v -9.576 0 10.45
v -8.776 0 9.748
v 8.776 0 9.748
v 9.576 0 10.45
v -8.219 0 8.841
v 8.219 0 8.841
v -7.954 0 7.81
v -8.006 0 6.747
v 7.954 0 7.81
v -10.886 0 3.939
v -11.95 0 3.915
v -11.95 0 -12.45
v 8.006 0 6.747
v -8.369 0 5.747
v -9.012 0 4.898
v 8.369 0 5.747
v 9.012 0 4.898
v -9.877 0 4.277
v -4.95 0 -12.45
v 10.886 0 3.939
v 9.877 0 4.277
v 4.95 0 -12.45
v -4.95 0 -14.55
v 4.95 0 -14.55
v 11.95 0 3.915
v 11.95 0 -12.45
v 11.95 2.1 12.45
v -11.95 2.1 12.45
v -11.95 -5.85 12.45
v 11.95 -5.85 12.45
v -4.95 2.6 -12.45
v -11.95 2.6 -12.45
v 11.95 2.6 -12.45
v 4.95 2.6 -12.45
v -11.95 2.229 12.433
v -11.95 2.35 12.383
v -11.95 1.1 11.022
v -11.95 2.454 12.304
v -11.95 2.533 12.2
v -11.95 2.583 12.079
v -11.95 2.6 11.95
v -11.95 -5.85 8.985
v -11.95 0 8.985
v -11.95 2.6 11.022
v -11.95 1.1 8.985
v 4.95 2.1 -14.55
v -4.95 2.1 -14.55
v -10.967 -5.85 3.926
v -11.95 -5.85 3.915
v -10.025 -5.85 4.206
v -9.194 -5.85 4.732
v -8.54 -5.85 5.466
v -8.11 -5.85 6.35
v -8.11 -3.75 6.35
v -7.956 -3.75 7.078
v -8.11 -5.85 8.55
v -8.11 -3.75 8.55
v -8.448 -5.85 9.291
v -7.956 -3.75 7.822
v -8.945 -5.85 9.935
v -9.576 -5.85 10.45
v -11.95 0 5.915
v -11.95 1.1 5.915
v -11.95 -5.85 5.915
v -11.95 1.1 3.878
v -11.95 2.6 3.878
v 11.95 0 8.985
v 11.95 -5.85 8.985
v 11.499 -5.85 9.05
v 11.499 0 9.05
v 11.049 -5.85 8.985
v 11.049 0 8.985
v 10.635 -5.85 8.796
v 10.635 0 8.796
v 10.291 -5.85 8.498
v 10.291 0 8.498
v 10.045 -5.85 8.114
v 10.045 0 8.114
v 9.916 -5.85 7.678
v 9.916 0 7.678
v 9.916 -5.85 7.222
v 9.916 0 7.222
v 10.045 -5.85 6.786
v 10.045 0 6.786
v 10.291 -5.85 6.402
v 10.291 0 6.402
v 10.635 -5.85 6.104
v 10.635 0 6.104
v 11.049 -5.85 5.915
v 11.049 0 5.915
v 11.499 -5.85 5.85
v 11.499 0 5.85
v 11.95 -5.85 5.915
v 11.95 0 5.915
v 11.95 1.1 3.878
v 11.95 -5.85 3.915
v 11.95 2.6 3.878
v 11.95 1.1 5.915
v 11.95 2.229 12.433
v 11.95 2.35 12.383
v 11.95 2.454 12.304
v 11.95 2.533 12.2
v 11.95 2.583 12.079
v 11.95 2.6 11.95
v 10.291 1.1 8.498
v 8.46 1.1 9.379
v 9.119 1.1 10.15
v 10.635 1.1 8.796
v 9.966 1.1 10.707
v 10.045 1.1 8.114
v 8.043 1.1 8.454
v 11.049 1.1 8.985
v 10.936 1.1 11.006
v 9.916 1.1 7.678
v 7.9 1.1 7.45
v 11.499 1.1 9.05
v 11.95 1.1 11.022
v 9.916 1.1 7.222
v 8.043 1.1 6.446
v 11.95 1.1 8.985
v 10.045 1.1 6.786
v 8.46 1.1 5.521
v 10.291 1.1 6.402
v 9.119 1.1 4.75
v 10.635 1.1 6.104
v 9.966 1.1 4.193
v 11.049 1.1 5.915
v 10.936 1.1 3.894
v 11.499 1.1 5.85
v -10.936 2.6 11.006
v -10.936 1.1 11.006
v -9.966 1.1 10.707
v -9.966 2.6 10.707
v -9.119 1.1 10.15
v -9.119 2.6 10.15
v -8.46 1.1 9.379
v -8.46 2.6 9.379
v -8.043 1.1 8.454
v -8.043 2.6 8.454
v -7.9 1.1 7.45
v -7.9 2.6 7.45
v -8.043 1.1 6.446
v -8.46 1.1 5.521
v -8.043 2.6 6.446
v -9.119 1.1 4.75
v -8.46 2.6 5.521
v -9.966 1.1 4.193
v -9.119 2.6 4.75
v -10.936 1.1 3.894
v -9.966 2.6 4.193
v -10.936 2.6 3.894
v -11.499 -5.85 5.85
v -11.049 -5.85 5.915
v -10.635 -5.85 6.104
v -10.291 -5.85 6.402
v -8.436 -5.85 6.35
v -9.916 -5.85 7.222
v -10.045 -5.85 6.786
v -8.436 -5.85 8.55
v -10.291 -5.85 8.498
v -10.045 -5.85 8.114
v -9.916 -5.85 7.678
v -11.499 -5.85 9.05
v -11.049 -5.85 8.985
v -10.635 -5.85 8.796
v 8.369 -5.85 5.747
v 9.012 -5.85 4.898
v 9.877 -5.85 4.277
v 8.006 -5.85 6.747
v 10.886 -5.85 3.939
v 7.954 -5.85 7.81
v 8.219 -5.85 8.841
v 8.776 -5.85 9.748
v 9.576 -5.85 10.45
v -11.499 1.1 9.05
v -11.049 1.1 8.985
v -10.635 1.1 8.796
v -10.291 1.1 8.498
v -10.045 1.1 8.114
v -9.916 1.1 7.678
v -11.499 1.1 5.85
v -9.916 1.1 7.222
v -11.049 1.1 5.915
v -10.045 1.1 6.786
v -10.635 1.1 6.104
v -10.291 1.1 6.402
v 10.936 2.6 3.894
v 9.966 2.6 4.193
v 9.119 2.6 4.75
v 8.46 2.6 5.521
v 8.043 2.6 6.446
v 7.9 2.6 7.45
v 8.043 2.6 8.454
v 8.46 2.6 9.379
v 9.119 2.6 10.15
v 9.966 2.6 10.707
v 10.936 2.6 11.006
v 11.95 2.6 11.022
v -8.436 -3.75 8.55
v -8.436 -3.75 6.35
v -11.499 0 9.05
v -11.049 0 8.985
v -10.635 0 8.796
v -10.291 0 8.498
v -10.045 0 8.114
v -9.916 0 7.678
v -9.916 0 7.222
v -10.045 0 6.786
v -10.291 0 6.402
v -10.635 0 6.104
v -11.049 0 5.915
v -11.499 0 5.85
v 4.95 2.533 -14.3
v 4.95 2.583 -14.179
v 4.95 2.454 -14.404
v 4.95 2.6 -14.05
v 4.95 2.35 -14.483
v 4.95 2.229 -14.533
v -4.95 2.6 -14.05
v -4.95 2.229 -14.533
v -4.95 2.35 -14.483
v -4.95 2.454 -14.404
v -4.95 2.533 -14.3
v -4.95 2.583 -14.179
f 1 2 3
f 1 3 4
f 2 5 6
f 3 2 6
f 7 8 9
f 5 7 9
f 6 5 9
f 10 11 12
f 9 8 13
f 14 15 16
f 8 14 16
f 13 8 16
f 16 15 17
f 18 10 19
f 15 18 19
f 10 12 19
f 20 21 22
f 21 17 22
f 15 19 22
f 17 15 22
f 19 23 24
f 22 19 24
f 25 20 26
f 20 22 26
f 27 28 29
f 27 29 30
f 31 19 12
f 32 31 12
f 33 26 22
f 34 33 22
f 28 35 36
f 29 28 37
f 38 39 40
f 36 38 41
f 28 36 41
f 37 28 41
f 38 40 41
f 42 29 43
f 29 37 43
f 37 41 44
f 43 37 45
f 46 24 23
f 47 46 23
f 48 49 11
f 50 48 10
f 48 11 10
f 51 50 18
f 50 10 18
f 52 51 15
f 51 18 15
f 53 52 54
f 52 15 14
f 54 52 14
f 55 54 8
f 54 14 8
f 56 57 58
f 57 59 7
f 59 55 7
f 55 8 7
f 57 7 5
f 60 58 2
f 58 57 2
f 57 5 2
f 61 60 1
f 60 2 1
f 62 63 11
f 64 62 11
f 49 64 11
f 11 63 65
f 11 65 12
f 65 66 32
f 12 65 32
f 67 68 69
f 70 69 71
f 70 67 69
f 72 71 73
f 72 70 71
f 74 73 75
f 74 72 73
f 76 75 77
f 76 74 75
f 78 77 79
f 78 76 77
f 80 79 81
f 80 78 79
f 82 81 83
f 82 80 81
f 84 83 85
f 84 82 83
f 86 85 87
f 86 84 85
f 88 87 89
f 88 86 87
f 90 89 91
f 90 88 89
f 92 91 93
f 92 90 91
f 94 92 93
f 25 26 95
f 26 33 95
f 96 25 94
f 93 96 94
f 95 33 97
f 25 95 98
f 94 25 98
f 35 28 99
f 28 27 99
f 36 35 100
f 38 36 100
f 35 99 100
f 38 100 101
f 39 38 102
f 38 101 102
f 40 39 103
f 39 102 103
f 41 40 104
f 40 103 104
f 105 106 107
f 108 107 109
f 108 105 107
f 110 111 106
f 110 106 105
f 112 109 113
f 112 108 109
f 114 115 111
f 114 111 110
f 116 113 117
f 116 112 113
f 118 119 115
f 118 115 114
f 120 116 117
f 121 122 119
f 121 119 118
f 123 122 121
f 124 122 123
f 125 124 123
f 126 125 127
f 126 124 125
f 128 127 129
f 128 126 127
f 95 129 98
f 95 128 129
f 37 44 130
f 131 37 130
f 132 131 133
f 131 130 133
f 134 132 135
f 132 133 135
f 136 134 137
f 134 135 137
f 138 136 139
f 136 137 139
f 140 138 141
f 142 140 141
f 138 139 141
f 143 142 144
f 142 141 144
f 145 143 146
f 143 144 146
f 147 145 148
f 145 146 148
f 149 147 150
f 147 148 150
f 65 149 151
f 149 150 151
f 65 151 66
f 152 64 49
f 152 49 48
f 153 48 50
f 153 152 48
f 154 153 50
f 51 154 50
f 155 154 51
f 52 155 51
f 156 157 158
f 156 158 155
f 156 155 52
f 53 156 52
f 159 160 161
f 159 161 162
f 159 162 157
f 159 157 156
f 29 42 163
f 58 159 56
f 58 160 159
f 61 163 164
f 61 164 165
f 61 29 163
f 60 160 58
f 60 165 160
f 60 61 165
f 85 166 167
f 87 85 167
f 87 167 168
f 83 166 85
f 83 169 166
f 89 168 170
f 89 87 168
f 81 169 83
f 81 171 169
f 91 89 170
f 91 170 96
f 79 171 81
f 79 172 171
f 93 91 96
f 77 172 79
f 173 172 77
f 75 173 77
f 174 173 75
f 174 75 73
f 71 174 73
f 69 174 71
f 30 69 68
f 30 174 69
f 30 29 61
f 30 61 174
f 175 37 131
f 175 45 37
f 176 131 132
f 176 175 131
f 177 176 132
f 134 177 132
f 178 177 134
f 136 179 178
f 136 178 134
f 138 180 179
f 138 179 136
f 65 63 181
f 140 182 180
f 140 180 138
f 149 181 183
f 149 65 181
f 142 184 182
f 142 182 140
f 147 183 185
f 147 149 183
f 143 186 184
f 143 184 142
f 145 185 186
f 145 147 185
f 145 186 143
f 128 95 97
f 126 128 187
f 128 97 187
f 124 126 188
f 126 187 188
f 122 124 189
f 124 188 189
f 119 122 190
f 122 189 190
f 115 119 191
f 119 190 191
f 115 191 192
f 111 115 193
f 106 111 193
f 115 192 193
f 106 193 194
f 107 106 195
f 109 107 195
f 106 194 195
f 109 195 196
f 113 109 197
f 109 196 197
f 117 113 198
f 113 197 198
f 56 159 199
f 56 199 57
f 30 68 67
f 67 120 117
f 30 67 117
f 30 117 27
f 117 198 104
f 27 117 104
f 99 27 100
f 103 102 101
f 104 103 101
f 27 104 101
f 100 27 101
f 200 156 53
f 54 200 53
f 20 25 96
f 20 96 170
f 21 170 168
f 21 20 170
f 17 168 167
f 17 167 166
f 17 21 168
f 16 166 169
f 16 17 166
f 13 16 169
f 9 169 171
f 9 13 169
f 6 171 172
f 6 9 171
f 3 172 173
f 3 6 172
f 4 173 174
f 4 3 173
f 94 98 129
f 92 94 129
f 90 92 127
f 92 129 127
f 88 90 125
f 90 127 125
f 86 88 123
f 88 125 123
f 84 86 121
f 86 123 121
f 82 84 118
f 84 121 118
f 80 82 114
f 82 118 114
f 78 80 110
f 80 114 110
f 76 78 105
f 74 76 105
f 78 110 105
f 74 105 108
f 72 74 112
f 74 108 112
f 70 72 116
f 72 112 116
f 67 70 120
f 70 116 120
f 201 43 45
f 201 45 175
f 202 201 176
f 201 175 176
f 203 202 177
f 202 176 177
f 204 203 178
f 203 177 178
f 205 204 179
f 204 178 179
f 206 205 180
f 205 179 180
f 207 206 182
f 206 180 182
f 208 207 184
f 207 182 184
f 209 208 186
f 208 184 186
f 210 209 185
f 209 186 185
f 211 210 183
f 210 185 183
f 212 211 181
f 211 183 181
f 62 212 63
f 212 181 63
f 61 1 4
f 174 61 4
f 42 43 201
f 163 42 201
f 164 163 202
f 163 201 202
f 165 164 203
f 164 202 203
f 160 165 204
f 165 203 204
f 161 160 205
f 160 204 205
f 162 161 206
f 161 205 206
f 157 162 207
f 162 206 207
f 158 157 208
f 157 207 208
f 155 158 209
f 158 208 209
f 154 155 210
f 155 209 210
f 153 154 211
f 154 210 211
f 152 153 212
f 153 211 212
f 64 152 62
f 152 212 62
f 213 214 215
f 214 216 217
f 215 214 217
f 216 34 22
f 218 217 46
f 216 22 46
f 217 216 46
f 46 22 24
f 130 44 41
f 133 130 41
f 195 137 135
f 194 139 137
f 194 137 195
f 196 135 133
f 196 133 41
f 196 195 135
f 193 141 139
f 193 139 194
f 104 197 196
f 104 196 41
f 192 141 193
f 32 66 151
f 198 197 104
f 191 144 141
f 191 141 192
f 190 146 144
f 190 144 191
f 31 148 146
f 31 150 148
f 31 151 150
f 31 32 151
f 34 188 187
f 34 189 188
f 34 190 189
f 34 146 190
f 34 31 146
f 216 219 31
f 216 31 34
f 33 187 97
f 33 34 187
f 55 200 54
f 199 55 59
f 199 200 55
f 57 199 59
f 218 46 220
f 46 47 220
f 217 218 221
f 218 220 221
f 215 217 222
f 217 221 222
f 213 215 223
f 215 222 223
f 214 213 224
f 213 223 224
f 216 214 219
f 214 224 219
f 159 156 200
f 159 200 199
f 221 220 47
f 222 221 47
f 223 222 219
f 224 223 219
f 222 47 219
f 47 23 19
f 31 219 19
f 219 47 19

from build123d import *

# Parameters (mm, degrees)
BOSS_EXTRUDE1_DEPTH = 2.6
SKETCH2_W           = 23.9
SKETCH2_H           = 2
BOSS_EXTRUDE2_DEPTH = 5.85
CUT_EXTRUDE1_REACH  = 22.638
SKETCH3_R           = 1.6
BOSS_EXTRUDE3_DEPTH = 5.85
SKETCH5_W           = 1
SKETCH5_H           = 2.2
CUT_EXTRUDE2_DEPTH  = 2.1
SKETCH6_R           = 3.6
CUT_EXTRUDE3_DEPTH  = 1.5
FILLET1_R           = 0.5


with BuildPart() as part:
    # Sketch1 → Boss-Extrude1 (new body)
    with BuildSketch(Plane(origin=(0, 0, 0), x_dir=(1, 0, 0), z_dir=(0, 1, 0))):
        Polygon((-11.95, 12.45), (-11.95, -12.45), (11.95, -12.45), (11.95, 12.45), (4.95, 12.45), (4.95, 14.55), (-4.95, 14.55), (-4.95, 12.45), align=None)
    extrude(amount=BOSS_EXTRUDE1_DEPTH)

    # Sketch2 → Boss-Extrude2 (add)
    with BuildSketch(Plane.XZ):
        with Locations((0, 11.45)):
            Rectangle(SKETCH2_W, SKETCH2_H)
    extrude(amount=BOSS_EXTRUDE2_DEPTH)

    # Sketch3 → Cut-Extrude1 (cut, up to next)
    with BuildSketch(Plane(origin=(0, 2.6, 0), x_dir=(1, 0, 0), z_dir=(0, 1, 0)), mode=Mode.PRIVATE) as cut_extrude1_sk1:
        with Locations((-11.5, -7.45)):
            Circle(SKETCH3_R)
    cut_extrude1_tool1 = extrude(cut_extrude1_sk1.sketch, amount=-CUT_EXTRUDE1_REACH, mode=Mode.PRIVATE) & part.part
    # Sketch3 → Cut-Extrude1 (cut, up to next)
    with BuildSketch(Plane(origin=(0, 2.6, 0), x_dir=(1, 0, 0), z_dir=(0, 1, 0)), mode=Mode.PRIVATE) as cut_extrude1_sk2:
        with Locations((11.5, -7.45)):
            Circle(SKETCH3_R)
    cut_extrude1_tool2 = extrude(cut_extrude1_sk2.sketch, amount=-CUT_EXTRUDE1_REACH, mode=Mode.PRIVATE) & part.part
    add(cut_extrude1_tool1.solids().sort_by_distance((-11.5, 2.6, 7.45))[0], mode=Mode.SUBTRACT)
    add(cut_extrude1_tool2.solids().sort_by_distance((11.5, 2.6, 7.45))[0], mode=Mode.SUBTRACT)

    # Sketch4 → Boss-Extrude3 (add)
    with BuildSketch(Plane.XZ):
        with BuildLine():
            Line((-11.95, 5.914584747), (-11.95, 3.914584747))
            ThreePointArc((-11.95, 3.914584747), (-7.936061026, 7.45), (-11.95, 10.985415253))
            Line((-11.95, 10.985415253), (-11.95, 8.985415253))
            ThreePointArc((-11.95, 8.985415253), (-9.9, 7.45), (-11.95, 5.914584747))
        make_face()
        with BuildLine():
            Line((11.95, 10.985415253), (11.95, 8.985415253))
            ThreePointArc((11.95, 8.985415253), (9.9, 7.45), (11.95, 5.914584747))
            Line((11.95, 5.914584747), (11.95, 3.914584747))
            ThreePointArc((11.95, 3.914584747), (7.936061026, 7.45), (11.95, 10.985415253))
        make_face()
    extrude(amount=BOSS_EXTRUDE3_DEPTH)

    # Sketch5 → Cut-Extrude2 (cut)
    with BuildSketch(Plane.XZ.offset(5.85)):
        with Locations((-7.936061026, 7.45)):
            Rectangle(SKETCH5_W, SKETCH5_H)
    extrude(amount=-CUT_EXTRUDE2_DEPTH, mode=Mode.SUBTRACT)

    # Sketch6 → Cut-Extrude3 (cut)
    with BuildSketch(Plane(origin=(0, 2.6, 0), x_dir=(1, 0, 0), z_dir=(0, 1, 0))):
        with Locations((11.5, -7.45)):
            Circle(SKETCH6_R)
        with Locations((-11.5, -7.45)):
            Circle(SKETCH6_R)
    extrude(amount=-CUT_EXTRUDE3_DEPTH, mode=Mode.SUBTRACT)

    # Fillet1
    fillet1_edges = [part.edges().sort_by_distance(p)[0] for p in [
        (0, 2.6, 12.45),
        (0, 2.6, -14.55),
    ]]
    fillet(fillet1_edges, radius=FILLET1_R)


solid = part.part
